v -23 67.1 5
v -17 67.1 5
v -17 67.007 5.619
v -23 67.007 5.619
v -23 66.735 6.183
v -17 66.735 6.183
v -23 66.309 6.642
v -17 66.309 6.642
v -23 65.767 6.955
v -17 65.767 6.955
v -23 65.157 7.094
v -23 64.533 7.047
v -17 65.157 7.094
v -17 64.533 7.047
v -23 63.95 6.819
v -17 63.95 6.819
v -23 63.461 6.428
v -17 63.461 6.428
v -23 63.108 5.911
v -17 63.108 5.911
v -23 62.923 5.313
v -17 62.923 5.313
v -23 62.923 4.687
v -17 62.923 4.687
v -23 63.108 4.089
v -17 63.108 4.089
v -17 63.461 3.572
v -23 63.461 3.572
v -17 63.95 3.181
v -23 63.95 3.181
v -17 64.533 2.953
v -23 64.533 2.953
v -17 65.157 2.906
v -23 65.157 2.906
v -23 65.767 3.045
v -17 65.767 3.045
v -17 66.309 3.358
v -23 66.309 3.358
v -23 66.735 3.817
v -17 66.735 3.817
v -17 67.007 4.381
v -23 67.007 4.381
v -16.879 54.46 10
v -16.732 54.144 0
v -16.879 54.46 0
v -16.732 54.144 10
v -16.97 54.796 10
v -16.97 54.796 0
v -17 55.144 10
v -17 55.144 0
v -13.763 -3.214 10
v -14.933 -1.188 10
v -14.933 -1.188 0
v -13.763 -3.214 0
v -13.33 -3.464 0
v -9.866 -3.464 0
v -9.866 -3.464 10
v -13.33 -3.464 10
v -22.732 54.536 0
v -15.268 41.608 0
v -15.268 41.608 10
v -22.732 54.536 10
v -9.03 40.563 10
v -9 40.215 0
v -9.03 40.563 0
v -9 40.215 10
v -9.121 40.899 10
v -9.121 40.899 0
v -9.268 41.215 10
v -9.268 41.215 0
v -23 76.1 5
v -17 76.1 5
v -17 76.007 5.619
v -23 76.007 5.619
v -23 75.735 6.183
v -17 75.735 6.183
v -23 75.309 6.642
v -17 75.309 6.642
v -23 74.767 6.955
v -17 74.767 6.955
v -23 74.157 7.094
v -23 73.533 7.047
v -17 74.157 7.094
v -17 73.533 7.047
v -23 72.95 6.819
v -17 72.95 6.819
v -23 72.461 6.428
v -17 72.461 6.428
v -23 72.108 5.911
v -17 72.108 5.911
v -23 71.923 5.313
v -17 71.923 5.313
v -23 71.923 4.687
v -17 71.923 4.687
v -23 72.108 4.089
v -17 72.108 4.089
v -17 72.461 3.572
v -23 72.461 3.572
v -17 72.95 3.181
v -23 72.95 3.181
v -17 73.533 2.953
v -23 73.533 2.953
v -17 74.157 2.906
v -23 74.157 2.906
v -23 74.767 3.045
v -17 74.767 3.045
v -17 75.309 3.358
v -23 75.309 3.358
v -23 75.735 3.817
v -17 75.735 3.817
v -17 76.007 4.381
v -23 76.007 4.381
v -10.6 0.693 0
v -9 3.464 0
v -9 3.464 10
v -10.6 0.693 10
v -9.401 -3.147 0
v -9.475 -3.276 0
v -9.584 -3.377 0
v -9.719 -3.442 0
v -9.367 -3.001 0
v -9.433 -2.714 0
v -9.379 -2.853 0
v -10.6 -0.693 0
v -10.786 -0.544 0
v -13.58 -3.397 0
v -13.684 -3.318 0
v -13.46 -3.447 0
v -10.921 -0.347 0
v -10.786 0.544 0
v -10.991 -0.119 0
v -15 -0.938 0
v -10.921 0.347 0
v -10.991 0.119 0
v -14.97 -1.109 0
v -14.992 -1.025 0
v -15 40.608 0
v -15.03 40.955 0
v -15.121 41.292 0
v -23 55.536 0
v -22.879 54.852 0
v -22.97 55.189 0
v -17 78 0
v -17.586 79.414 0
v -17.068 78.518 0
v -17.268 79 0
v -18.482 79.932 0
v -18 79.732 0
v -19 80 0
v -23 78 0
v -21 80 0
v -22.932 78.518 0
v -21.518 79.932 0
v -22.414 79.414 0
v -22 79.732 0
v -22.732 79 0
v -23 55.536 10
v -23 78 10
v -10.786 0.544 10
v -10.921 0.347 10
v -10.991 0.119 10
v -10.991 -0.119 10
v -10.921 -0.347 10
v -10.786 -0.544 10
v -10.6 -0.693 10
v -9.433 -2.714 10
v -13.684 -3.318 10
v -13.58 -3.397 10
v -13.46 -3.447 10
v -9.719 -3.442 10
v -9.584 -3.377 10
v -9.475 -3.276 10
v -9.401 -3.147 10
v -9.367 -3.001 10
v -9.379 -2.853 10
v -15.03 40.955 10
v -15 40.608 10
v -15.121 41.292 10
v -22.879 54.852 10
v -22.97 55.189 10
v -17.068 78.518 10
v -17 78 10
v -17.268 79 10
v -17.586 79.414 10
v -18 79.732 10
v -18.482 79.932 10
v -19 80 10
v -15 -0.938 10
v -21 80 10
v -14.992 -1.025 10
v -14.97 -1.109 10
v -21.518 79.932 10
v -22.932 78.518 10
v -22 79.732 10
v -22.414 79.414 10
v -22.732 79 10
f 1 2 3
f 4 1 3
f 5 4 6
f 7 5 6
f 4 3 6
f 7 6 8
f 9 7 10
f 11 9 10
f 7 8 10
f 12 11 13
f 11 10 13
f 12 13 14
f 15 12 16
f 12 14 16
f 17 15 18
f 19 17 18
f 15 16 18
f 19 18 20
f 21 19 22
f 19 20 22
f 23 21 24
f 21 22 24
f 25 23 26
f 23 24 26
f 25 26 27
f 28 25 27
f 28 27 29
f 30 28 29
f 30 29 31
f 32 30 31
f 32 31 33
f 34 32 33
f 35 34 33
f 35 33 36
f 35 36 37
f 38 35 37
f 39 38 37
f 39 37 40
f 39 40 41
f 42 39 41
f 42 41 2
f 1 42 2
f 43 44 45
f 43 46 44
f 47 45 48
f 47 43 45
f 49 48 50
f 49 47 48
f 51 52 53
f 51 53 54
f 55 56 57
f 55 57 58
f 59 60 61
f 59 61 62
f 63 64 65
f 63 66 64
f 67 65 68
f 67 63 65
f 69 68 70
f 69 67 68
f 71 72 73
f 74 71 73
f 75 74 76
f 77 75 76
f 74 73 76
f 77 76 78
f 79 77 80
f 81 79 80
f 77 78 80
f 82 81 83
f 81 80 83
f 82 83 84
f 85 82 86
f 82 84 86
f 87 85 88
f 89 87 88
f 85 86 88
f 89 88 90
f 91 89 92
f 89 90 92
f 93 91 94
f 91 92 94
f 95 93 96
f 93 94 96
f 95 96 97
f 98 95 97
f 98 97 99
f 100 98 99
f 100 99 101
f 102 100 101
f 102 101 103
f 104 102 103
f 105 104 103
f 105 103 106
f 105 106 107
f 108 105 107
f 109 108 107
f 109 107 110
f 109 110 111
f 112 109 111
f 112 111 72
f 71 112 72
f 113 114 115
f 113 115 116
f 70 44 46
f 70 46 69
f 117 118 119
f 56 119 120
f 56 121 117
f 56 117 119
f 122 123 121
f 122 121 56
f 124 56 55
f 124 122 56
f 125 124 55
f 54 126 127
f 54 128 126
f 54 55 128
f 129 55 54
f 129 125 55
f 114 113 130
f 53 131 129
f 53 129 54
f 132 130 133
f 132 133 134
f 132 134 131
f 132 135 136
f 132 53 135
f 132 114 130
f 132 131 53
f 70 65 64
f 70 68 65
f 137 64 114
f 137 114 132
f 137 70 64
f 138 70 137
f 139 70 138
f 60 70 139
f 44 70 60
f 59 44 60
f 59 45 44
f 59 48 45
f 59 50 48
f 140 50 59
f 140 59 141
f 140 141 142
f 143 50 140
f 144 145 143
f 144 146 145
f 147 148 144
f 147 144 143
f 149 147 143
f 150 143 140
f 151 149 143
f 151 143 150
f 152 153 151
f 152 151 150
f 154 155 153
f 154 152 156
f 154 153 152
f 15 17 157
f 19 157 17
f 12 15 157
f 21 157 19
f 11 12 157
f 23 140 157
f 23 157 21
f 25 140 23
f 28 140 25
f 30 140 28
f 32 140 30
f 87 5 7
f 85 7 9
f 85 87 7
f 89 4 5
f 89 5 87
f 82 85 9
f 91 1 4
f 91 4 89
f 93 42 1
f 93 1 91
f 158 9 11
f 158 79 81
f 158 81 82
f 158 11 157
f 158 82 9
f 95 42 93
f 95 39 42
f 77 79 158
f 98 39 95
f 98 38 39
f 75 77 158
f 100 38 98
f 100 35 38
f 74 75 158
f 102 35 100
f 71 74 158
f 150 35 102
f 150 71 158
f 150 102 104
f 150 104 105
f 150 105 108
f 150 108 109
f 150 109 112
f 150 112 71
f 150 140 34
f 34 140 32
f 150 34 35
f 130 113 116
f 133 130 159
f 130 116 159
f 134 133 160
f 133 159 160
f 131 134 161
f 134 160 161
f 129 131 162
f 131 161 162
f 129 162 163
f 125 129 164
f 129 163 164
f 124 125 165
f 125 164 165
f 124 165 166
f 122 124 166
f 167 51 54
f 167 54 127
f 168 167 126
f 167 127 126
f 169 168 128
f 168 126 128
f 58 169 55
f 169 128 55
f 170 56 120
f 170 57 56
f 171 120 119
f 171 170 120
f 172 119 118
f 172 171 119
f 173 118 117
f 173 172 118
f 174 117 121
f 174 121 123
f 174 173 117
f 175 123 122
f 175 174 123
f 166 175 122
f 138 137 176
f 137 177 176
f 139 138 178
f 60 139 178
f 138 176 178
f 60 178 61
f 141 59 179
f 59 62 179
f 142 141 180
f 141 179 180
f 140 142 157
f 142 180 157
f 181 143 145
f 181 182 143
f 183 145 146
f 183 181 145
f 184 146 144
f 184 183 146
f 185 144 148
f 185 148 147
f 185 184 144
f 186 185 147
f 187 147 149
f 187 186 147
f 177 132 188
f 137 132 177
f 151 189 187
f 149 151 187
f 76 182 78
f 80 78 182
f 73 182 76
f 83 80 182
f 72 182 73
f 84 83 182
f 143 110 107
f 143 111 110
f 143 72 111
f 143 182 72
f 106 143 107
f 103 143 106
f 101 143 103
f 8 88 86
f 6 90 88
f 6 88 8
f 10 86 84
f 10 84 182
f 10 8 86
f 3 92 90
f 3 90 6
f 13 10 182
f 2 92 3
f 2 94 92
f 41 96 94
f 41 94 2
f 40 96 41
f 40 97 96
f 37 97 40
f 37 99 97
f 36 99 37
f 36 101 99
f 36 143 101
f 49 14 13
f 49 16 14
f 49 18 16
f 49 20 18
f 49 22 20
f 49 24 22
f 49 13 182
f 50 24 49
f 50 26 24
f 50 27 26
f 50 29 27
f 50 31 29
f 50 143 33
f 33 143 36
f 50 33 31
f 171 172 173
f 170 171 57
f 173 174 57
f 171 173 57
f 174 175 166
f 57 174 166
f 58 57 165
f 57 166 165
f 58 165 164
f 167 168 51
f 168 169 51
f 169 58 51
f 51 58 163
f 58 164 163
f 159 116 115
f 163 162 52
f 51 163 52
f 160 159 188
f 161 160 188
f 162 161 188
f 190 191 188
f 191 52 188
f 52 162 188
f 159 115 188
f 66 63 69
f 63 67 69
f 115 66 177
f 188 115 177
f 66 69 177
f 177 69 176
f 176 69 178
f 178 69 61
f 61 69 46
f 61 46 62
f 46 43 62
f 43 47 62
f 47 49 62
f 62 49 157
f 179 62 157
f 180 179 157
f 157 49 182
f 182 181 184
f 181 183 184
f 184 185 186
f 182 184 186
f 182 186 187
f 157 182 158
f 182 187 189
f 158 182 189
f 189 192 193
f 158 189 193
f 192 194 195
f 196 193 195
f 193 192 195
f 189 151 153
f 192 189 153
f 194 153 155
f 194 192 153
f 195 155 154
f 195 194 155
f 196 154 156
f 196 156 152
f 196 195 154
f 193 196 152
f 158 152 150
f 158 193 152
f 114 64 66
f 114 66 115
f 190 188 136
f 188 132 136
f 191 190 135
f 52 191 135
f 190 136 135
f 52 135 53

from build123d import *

# Parameters (mm, degrees)
EXTRUDE_1_DEPTH     = 10
SKETCH_2_R          = 2.1
CUT_EXTRUDE_1_DEPTH = 82.018516402
SKETCH_3_R          = 0.8
CUT_EXTRUDE_2_DEPTH = 84.839131675
FILLET_1_R          = 0.5
FILLET_2_R          = 2


with BuildPart() as part:
    # 草图1 → 凸台-拉伸1 (new body)
    with BuildSketch(Plane.XY):
        Polygon((-9, 3.464101615), (-11, 0), (-9, -3.464101615), (-15, -3.464101615), (-15, 41.143593539), (-23, 55), (-23, 80), (-17, 80), (-17, 54.607695155), (-9, 40.751288694), align=None)
    extrude(amount=EXTRUDE_1_DEPTH)

    # 草图2 → 切除-拉伸1 (cut, through all)
    with BuildSketch(Plane(origin=(-17, 0, 0), x_dir=(0, 0, -1), z_dir=(1, 0, 0))):
        with Locations(Location((-5, 65, 0), (0, 0, 90))):
            Circle(SKETCH_2_R)
        with Locations(Location((-5, 74, 0), (0, 0, 90))):
            Circle(SKETCH_2_R)
    extrude(amount=-CUT_EXTRUDE_1_DEPTH, mode=Mode.SUBTRACT)

    # 草图3 → 切除-拉伸2 (cut, through all)
    with BuildSketch(Plane.XY.offset(10)):
        with Locations((-10.2, 0)):
            Circle(SKETCH_3_R)
        Polygon((-15, -1.07179677), (-13.618802154, -3.464101615), (-15, -3.464101615), align=None)
    extrude(amount=-CUT_EXTRUDE_2_DEPTH, mode=Mode.SUBTRACT)

    # 圆角1
    fillet_1_edges = [part.edges().sort_by_distance(p)[0] for p in [
        (-9, -3.464101615, 5),
        (-15, -1.07179677, 5),
        (-13.618802154, -3.464101615, 5),
    ]]
    fillet(fillet_1_edges, radius=FILLET_1_R)

    # 圆角2
    fillet_2_edges = [part.edges().sort_by_distance(p)[0] for p in [
        (-15, 41.143593539, 5),
        (-23, 55, 5),
        (-23, 80, 5),
        (-17, 80, 5),
        (-17, 54.607695155, 5),
        (-9, 40.751288694, 5),
    ]]
    fillet(fillet_2_edges, radius=FILLET_2_R)


solid = part.part
